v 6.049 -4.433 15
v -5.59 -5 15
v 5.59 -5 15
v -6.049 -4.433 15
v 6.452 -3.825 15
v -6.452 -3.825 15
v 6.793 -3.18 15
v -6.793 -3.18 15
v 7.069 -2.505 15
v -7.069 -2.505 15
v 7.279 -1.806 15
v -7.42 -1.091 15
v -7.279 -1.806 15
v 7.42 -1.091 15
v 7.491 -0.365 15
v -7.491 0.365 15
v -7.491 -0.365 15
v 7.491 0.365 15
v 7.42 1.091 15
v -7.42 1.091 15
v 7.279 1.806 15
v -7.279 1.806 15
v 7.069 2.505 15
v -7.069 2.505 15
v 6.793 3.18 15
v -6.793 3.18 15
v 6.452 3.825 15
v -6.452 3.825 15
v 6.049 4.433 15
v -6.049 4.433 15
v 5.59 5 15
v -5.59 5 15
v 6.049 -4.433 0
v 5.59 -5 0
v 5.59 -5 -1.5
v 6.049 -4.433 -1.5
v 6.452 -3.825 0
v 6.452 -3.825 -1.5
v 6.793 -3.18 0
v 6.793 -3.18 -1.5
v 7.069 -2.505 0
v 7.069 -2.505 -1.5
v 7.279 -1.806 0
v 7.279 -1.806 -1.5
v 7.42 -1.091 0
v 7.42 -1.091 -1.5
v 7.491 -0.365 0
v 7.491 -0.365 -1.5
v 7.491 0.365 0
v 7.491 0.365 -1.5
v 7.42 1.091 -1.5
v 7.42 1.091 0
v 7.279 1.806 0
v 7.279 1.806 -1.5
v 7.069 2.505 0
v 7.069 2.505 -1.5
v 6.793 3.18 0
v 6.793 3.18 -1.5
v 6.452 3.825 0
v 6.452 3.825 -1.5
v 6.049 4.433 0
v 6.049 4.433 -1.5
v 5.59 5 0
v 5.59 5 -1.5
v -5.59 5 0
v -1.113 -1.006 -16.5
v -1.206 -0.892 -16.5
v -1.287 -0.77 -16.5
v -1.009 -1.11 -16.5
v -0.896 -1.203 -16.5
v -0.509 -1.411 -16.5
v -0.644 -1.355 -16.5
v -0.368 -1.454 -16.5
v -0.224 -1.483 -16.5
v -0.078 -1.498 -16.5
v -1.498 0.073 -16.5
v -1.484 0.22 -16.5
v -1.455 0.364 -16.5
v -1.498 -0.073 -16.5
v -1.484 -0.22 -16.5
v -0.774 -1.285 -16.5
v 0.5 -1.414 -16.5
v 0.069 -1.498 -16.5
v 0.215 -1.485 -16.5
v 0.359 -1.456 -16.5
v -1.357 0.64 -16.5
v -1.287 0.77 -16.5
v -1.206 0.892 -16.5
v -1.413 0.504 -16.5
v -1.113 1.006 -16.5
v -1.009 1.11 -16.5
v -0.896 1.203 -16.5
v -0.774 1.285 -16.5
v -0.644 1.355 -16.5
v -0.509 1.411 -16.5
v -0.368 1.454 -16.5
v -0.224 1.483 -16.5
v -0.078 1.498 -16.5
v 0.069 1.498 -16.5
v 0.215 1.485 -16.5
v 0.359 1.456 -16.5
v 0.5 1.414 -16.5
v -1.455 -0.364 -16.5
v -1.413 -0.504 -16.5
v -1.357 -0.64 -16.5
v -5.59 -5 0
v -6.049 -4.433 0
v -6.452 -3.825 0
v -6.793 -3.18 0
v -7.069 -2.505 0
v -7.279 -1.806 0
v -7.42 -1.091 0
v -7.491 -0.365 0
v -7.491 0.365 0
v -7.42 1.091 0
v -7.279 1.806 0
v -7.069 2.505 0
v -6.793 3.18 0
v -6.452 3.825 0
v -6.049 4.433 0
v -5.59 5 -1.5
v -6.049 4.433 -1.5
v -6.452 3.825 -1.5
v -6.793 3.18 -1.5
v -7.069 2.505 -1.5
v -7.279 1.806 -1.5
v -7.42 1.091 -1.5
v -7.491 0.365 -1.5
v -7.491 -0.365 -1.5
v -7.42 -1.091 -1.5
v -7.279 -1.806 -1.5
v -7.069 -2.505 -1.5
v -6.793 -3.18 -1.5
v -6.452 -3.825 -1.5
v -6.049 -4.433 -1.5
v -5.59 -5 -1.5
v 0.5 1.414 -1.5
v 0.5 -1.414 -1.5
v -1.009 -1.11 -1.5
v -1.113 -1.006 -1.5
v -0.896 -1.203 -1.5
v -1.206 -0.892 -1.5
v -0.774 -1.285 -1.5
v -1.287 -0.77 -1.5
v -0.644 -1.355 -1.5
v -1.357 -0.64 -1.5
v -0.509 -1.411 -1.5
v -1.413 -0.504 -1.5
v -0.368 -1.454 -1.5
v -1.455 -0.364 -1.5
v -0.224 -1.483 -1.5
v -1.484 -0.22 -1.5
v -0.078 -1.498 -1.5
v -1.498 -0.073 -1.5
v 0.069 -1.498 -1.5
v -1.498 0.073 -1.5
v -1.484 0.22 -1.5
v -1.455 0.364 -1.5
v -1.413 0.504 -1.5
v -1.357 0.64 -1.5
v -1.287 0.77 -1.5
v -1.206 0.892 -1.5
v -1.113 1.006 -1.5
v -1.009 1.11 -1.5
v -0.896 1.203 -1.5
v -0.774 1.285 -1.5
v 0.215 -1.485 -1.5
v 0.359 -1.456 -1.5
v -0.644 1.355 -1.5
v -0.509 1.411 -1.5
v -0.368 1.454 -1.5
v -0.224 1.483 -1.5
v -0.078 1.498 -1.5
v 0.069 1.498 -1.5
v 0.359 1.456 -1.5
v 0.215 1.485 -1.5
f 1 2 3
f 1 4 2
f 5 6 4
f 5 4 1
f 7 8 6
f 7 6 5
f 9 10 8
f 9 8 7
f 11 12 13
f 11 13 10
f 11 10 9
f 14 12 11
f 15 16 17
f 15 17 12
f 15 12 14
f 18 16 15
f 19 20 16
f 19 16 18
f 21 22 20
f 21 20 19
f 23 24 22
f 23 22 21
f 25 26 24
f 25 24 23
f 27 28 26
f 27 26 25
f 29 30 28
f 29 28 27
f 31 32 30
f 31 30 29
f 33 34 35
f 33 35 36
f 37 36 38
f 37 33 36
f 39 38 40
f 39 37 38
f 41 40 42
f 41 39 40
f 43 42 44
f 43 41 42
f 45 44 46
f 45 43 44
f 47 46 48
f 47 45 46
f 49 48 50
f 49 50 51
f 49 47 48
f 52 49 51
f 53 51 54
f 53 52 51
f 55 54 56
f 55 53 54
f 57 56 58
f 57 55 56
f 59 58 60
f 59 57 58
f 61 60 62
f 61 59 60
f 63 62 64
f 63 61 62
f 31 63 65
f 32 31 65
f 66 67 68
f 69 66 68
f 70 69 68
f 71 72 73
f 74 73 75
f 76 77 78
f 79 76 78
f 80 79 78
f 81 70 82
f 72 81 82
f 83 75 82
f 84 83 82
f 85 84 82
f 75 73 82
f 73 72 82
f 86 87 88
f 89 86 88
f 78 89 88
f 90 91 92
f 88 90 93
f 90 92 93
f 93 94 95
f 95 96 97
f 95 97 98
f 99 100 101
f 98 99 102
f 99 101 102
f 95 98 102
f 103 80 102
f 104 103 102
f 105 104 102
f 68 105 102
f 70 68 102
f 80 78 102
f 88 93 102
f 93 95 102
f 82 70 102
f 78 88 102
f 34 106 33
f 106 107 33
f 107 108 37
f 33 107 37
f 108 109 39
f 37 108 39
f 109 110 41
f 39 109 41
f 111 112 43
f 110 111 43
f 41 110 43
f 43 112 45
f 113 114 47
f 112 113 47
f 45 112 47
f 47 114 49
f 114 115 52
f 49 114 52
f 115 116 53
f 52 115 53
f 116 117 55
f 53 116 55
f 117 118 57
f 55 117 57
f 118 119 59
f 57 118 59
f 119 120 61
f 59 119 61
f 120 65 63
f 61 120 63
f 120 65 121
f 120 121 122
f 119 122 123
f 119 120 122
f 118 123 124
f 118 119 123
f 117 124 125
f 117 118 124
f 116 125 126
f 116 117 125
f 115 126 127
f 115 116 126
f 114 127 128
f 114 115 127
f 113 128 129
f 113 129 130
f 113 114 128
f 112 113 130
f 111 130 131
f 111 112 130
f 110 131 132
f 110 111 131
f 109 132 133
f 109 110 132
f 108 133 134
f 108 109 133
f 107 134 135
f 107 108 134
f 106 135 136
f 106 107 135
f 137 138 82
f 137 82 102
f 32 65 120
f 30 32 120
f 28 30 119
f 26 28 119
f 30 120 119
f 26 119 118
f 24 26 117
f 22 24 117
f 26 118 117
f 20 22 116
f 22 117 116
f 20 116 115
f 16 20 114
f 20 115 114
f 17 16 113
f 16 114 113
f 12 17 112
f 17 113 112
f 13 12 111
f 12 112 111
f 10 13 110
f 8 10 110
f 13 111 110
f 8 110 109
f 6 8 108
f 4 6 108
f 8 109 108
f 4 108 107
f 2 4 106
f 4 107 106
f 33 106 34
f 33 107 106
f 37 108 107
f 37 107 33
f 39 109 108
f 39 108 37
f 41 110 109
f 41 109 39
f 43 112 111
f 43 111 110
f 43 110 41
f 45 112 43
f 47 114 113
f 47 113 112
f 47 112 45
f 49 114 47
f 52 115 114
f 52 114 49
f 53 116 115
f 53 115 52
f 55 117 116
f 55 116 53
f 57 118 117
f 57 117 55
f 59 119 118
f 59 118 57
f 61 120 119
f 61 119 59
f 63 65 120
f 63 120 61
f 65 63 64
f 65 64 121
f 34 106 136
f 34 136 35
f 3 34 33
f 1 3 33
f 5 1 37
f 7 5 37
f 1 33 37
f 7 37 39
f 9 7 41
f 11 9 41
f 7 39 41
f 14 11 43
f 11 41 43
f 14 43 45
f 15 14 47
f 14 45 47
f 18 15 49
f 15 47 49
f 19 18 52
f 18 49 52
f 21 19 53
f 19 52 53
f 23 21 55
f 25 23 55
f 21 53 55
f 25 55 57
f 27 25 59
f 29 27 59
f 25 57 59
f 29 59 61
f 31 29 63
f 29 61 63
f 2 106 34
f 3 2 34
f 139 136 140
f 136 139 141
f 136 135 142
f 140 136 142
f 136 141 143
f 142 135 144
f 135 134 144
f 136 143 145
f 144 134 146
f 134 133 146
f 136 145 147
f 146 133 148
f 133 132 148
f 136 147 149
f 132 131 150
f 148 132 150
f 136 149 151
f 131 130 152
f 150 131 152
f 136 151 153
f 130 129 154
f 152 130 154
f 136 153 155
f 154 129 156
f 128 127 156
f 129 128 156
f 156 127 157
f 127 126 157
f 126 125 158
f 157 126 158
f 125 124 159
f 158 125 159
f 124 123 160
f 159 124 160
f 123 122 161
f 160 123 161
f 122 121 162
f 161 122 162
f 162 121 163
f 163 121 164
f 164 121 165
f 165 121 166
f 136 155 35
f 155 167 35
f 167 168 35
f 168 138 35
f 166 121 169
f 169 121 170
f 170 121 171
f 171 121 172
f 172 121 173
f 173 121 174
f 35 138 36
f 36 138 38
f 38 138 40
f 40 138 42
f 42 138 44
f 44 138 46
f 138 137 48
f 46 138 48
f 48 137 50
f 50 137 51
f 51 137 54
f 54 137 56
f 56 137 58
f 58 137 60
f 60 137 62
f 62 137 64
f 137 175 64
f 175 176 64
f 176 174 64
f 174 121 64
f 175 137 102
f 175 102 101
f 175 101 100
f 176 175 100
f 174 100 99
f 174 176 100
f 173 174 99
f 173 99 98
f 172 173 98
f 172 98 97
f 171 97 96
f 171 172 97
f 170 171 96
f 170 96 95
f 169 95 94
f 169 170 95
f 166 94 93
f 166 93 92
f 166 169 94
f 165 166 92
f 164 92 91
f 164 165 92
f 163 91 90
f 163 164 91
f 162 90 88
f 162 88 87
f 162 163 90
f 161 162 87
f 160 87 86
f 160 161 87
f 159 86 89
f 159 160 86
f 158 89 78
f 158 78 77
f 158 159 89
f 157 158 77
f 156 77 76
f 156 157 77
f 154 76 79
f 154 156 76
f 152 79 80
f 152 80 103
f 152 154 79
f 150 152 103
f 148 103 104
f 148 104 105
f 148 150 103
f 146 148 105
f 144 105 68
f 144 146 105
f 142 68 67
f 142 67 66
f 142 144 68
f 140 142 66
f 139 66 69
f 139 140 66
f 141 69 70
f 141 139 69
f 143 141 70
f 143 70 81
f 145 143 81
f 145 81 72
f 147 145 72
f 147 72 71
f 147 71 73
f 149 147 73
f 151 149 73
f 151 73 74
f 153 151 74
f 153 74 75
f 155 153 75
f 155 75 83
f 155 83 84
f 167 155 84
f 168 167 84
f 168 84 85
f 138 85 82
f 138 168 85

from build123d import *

# Parameters (mm, degrees)
BOSS_EXTRUDE1_DEPTH = 15
BOSS_EXTRUDE2_DEPTH = 1.5
BOSS_EXTRUDE3_DEPTH = 15


with BuildPart() as part:
    # Sketch1 → Boss-Extrude1 (new body)
    with BuildSketch(Plane.XY):
        with BuildLine():
            Line((-5.590169944, -5), (5.590169944, -5))
            ThreePointArc((5.590169944, -5), (7.5, 0), (5.590169944, 5))
            Line((5.590169944, 5), (-5.590169944, 5))
            ThreePointArc((-5.590169944, 5), (-7.5, 0), (-5.590169944, -5))
        make_face()
    extrude(amount=BOSS_EXTRUDE1_DEPTH)


with BuildPart() as body_2:
    # Sketch2 → Boss-Extrude2 (new body)
    with BuildSketch(Plane(origin=(0, 0, 0), x_dir=(-1, 0, 0), z_dir=(0, 0, -1))):
        with BuildLine():
            Line((5.590169944, -5), (-5.590169944, -5))
            ThreePointArc((-5.590169944, -5), (-7.5, 0), (-5.590169944, 5))
            Line((-5.590169944, 5), (5.590169944, 5))
            ThreePointArc((5.590169944, 5), (7.5, 0), (5.590169944, -5))
        make_face()
    extrude(amount=BOSS_EXTRUDE2_DEPTH)

    # Sketch3 → Boss-Extrude3 (add)
    with BuildSketch(Plane(origin=(0, 0, -1.5), x_dir=(-1, 0, 0), z_dir=(0, 0, -1))):
        with BuildLine():
            Line((-0.5, -1.414213562), (-0.5, 1.414213562))
            ThreePointArc((-0.5, 1.414213562), (1.5, 0), (-0.5, -1.414213562))
        make_face()
    extrude(amount=BOSS_EXTRUDE3_DEPTH)


solid = Compound([part.part, body_2.part])
